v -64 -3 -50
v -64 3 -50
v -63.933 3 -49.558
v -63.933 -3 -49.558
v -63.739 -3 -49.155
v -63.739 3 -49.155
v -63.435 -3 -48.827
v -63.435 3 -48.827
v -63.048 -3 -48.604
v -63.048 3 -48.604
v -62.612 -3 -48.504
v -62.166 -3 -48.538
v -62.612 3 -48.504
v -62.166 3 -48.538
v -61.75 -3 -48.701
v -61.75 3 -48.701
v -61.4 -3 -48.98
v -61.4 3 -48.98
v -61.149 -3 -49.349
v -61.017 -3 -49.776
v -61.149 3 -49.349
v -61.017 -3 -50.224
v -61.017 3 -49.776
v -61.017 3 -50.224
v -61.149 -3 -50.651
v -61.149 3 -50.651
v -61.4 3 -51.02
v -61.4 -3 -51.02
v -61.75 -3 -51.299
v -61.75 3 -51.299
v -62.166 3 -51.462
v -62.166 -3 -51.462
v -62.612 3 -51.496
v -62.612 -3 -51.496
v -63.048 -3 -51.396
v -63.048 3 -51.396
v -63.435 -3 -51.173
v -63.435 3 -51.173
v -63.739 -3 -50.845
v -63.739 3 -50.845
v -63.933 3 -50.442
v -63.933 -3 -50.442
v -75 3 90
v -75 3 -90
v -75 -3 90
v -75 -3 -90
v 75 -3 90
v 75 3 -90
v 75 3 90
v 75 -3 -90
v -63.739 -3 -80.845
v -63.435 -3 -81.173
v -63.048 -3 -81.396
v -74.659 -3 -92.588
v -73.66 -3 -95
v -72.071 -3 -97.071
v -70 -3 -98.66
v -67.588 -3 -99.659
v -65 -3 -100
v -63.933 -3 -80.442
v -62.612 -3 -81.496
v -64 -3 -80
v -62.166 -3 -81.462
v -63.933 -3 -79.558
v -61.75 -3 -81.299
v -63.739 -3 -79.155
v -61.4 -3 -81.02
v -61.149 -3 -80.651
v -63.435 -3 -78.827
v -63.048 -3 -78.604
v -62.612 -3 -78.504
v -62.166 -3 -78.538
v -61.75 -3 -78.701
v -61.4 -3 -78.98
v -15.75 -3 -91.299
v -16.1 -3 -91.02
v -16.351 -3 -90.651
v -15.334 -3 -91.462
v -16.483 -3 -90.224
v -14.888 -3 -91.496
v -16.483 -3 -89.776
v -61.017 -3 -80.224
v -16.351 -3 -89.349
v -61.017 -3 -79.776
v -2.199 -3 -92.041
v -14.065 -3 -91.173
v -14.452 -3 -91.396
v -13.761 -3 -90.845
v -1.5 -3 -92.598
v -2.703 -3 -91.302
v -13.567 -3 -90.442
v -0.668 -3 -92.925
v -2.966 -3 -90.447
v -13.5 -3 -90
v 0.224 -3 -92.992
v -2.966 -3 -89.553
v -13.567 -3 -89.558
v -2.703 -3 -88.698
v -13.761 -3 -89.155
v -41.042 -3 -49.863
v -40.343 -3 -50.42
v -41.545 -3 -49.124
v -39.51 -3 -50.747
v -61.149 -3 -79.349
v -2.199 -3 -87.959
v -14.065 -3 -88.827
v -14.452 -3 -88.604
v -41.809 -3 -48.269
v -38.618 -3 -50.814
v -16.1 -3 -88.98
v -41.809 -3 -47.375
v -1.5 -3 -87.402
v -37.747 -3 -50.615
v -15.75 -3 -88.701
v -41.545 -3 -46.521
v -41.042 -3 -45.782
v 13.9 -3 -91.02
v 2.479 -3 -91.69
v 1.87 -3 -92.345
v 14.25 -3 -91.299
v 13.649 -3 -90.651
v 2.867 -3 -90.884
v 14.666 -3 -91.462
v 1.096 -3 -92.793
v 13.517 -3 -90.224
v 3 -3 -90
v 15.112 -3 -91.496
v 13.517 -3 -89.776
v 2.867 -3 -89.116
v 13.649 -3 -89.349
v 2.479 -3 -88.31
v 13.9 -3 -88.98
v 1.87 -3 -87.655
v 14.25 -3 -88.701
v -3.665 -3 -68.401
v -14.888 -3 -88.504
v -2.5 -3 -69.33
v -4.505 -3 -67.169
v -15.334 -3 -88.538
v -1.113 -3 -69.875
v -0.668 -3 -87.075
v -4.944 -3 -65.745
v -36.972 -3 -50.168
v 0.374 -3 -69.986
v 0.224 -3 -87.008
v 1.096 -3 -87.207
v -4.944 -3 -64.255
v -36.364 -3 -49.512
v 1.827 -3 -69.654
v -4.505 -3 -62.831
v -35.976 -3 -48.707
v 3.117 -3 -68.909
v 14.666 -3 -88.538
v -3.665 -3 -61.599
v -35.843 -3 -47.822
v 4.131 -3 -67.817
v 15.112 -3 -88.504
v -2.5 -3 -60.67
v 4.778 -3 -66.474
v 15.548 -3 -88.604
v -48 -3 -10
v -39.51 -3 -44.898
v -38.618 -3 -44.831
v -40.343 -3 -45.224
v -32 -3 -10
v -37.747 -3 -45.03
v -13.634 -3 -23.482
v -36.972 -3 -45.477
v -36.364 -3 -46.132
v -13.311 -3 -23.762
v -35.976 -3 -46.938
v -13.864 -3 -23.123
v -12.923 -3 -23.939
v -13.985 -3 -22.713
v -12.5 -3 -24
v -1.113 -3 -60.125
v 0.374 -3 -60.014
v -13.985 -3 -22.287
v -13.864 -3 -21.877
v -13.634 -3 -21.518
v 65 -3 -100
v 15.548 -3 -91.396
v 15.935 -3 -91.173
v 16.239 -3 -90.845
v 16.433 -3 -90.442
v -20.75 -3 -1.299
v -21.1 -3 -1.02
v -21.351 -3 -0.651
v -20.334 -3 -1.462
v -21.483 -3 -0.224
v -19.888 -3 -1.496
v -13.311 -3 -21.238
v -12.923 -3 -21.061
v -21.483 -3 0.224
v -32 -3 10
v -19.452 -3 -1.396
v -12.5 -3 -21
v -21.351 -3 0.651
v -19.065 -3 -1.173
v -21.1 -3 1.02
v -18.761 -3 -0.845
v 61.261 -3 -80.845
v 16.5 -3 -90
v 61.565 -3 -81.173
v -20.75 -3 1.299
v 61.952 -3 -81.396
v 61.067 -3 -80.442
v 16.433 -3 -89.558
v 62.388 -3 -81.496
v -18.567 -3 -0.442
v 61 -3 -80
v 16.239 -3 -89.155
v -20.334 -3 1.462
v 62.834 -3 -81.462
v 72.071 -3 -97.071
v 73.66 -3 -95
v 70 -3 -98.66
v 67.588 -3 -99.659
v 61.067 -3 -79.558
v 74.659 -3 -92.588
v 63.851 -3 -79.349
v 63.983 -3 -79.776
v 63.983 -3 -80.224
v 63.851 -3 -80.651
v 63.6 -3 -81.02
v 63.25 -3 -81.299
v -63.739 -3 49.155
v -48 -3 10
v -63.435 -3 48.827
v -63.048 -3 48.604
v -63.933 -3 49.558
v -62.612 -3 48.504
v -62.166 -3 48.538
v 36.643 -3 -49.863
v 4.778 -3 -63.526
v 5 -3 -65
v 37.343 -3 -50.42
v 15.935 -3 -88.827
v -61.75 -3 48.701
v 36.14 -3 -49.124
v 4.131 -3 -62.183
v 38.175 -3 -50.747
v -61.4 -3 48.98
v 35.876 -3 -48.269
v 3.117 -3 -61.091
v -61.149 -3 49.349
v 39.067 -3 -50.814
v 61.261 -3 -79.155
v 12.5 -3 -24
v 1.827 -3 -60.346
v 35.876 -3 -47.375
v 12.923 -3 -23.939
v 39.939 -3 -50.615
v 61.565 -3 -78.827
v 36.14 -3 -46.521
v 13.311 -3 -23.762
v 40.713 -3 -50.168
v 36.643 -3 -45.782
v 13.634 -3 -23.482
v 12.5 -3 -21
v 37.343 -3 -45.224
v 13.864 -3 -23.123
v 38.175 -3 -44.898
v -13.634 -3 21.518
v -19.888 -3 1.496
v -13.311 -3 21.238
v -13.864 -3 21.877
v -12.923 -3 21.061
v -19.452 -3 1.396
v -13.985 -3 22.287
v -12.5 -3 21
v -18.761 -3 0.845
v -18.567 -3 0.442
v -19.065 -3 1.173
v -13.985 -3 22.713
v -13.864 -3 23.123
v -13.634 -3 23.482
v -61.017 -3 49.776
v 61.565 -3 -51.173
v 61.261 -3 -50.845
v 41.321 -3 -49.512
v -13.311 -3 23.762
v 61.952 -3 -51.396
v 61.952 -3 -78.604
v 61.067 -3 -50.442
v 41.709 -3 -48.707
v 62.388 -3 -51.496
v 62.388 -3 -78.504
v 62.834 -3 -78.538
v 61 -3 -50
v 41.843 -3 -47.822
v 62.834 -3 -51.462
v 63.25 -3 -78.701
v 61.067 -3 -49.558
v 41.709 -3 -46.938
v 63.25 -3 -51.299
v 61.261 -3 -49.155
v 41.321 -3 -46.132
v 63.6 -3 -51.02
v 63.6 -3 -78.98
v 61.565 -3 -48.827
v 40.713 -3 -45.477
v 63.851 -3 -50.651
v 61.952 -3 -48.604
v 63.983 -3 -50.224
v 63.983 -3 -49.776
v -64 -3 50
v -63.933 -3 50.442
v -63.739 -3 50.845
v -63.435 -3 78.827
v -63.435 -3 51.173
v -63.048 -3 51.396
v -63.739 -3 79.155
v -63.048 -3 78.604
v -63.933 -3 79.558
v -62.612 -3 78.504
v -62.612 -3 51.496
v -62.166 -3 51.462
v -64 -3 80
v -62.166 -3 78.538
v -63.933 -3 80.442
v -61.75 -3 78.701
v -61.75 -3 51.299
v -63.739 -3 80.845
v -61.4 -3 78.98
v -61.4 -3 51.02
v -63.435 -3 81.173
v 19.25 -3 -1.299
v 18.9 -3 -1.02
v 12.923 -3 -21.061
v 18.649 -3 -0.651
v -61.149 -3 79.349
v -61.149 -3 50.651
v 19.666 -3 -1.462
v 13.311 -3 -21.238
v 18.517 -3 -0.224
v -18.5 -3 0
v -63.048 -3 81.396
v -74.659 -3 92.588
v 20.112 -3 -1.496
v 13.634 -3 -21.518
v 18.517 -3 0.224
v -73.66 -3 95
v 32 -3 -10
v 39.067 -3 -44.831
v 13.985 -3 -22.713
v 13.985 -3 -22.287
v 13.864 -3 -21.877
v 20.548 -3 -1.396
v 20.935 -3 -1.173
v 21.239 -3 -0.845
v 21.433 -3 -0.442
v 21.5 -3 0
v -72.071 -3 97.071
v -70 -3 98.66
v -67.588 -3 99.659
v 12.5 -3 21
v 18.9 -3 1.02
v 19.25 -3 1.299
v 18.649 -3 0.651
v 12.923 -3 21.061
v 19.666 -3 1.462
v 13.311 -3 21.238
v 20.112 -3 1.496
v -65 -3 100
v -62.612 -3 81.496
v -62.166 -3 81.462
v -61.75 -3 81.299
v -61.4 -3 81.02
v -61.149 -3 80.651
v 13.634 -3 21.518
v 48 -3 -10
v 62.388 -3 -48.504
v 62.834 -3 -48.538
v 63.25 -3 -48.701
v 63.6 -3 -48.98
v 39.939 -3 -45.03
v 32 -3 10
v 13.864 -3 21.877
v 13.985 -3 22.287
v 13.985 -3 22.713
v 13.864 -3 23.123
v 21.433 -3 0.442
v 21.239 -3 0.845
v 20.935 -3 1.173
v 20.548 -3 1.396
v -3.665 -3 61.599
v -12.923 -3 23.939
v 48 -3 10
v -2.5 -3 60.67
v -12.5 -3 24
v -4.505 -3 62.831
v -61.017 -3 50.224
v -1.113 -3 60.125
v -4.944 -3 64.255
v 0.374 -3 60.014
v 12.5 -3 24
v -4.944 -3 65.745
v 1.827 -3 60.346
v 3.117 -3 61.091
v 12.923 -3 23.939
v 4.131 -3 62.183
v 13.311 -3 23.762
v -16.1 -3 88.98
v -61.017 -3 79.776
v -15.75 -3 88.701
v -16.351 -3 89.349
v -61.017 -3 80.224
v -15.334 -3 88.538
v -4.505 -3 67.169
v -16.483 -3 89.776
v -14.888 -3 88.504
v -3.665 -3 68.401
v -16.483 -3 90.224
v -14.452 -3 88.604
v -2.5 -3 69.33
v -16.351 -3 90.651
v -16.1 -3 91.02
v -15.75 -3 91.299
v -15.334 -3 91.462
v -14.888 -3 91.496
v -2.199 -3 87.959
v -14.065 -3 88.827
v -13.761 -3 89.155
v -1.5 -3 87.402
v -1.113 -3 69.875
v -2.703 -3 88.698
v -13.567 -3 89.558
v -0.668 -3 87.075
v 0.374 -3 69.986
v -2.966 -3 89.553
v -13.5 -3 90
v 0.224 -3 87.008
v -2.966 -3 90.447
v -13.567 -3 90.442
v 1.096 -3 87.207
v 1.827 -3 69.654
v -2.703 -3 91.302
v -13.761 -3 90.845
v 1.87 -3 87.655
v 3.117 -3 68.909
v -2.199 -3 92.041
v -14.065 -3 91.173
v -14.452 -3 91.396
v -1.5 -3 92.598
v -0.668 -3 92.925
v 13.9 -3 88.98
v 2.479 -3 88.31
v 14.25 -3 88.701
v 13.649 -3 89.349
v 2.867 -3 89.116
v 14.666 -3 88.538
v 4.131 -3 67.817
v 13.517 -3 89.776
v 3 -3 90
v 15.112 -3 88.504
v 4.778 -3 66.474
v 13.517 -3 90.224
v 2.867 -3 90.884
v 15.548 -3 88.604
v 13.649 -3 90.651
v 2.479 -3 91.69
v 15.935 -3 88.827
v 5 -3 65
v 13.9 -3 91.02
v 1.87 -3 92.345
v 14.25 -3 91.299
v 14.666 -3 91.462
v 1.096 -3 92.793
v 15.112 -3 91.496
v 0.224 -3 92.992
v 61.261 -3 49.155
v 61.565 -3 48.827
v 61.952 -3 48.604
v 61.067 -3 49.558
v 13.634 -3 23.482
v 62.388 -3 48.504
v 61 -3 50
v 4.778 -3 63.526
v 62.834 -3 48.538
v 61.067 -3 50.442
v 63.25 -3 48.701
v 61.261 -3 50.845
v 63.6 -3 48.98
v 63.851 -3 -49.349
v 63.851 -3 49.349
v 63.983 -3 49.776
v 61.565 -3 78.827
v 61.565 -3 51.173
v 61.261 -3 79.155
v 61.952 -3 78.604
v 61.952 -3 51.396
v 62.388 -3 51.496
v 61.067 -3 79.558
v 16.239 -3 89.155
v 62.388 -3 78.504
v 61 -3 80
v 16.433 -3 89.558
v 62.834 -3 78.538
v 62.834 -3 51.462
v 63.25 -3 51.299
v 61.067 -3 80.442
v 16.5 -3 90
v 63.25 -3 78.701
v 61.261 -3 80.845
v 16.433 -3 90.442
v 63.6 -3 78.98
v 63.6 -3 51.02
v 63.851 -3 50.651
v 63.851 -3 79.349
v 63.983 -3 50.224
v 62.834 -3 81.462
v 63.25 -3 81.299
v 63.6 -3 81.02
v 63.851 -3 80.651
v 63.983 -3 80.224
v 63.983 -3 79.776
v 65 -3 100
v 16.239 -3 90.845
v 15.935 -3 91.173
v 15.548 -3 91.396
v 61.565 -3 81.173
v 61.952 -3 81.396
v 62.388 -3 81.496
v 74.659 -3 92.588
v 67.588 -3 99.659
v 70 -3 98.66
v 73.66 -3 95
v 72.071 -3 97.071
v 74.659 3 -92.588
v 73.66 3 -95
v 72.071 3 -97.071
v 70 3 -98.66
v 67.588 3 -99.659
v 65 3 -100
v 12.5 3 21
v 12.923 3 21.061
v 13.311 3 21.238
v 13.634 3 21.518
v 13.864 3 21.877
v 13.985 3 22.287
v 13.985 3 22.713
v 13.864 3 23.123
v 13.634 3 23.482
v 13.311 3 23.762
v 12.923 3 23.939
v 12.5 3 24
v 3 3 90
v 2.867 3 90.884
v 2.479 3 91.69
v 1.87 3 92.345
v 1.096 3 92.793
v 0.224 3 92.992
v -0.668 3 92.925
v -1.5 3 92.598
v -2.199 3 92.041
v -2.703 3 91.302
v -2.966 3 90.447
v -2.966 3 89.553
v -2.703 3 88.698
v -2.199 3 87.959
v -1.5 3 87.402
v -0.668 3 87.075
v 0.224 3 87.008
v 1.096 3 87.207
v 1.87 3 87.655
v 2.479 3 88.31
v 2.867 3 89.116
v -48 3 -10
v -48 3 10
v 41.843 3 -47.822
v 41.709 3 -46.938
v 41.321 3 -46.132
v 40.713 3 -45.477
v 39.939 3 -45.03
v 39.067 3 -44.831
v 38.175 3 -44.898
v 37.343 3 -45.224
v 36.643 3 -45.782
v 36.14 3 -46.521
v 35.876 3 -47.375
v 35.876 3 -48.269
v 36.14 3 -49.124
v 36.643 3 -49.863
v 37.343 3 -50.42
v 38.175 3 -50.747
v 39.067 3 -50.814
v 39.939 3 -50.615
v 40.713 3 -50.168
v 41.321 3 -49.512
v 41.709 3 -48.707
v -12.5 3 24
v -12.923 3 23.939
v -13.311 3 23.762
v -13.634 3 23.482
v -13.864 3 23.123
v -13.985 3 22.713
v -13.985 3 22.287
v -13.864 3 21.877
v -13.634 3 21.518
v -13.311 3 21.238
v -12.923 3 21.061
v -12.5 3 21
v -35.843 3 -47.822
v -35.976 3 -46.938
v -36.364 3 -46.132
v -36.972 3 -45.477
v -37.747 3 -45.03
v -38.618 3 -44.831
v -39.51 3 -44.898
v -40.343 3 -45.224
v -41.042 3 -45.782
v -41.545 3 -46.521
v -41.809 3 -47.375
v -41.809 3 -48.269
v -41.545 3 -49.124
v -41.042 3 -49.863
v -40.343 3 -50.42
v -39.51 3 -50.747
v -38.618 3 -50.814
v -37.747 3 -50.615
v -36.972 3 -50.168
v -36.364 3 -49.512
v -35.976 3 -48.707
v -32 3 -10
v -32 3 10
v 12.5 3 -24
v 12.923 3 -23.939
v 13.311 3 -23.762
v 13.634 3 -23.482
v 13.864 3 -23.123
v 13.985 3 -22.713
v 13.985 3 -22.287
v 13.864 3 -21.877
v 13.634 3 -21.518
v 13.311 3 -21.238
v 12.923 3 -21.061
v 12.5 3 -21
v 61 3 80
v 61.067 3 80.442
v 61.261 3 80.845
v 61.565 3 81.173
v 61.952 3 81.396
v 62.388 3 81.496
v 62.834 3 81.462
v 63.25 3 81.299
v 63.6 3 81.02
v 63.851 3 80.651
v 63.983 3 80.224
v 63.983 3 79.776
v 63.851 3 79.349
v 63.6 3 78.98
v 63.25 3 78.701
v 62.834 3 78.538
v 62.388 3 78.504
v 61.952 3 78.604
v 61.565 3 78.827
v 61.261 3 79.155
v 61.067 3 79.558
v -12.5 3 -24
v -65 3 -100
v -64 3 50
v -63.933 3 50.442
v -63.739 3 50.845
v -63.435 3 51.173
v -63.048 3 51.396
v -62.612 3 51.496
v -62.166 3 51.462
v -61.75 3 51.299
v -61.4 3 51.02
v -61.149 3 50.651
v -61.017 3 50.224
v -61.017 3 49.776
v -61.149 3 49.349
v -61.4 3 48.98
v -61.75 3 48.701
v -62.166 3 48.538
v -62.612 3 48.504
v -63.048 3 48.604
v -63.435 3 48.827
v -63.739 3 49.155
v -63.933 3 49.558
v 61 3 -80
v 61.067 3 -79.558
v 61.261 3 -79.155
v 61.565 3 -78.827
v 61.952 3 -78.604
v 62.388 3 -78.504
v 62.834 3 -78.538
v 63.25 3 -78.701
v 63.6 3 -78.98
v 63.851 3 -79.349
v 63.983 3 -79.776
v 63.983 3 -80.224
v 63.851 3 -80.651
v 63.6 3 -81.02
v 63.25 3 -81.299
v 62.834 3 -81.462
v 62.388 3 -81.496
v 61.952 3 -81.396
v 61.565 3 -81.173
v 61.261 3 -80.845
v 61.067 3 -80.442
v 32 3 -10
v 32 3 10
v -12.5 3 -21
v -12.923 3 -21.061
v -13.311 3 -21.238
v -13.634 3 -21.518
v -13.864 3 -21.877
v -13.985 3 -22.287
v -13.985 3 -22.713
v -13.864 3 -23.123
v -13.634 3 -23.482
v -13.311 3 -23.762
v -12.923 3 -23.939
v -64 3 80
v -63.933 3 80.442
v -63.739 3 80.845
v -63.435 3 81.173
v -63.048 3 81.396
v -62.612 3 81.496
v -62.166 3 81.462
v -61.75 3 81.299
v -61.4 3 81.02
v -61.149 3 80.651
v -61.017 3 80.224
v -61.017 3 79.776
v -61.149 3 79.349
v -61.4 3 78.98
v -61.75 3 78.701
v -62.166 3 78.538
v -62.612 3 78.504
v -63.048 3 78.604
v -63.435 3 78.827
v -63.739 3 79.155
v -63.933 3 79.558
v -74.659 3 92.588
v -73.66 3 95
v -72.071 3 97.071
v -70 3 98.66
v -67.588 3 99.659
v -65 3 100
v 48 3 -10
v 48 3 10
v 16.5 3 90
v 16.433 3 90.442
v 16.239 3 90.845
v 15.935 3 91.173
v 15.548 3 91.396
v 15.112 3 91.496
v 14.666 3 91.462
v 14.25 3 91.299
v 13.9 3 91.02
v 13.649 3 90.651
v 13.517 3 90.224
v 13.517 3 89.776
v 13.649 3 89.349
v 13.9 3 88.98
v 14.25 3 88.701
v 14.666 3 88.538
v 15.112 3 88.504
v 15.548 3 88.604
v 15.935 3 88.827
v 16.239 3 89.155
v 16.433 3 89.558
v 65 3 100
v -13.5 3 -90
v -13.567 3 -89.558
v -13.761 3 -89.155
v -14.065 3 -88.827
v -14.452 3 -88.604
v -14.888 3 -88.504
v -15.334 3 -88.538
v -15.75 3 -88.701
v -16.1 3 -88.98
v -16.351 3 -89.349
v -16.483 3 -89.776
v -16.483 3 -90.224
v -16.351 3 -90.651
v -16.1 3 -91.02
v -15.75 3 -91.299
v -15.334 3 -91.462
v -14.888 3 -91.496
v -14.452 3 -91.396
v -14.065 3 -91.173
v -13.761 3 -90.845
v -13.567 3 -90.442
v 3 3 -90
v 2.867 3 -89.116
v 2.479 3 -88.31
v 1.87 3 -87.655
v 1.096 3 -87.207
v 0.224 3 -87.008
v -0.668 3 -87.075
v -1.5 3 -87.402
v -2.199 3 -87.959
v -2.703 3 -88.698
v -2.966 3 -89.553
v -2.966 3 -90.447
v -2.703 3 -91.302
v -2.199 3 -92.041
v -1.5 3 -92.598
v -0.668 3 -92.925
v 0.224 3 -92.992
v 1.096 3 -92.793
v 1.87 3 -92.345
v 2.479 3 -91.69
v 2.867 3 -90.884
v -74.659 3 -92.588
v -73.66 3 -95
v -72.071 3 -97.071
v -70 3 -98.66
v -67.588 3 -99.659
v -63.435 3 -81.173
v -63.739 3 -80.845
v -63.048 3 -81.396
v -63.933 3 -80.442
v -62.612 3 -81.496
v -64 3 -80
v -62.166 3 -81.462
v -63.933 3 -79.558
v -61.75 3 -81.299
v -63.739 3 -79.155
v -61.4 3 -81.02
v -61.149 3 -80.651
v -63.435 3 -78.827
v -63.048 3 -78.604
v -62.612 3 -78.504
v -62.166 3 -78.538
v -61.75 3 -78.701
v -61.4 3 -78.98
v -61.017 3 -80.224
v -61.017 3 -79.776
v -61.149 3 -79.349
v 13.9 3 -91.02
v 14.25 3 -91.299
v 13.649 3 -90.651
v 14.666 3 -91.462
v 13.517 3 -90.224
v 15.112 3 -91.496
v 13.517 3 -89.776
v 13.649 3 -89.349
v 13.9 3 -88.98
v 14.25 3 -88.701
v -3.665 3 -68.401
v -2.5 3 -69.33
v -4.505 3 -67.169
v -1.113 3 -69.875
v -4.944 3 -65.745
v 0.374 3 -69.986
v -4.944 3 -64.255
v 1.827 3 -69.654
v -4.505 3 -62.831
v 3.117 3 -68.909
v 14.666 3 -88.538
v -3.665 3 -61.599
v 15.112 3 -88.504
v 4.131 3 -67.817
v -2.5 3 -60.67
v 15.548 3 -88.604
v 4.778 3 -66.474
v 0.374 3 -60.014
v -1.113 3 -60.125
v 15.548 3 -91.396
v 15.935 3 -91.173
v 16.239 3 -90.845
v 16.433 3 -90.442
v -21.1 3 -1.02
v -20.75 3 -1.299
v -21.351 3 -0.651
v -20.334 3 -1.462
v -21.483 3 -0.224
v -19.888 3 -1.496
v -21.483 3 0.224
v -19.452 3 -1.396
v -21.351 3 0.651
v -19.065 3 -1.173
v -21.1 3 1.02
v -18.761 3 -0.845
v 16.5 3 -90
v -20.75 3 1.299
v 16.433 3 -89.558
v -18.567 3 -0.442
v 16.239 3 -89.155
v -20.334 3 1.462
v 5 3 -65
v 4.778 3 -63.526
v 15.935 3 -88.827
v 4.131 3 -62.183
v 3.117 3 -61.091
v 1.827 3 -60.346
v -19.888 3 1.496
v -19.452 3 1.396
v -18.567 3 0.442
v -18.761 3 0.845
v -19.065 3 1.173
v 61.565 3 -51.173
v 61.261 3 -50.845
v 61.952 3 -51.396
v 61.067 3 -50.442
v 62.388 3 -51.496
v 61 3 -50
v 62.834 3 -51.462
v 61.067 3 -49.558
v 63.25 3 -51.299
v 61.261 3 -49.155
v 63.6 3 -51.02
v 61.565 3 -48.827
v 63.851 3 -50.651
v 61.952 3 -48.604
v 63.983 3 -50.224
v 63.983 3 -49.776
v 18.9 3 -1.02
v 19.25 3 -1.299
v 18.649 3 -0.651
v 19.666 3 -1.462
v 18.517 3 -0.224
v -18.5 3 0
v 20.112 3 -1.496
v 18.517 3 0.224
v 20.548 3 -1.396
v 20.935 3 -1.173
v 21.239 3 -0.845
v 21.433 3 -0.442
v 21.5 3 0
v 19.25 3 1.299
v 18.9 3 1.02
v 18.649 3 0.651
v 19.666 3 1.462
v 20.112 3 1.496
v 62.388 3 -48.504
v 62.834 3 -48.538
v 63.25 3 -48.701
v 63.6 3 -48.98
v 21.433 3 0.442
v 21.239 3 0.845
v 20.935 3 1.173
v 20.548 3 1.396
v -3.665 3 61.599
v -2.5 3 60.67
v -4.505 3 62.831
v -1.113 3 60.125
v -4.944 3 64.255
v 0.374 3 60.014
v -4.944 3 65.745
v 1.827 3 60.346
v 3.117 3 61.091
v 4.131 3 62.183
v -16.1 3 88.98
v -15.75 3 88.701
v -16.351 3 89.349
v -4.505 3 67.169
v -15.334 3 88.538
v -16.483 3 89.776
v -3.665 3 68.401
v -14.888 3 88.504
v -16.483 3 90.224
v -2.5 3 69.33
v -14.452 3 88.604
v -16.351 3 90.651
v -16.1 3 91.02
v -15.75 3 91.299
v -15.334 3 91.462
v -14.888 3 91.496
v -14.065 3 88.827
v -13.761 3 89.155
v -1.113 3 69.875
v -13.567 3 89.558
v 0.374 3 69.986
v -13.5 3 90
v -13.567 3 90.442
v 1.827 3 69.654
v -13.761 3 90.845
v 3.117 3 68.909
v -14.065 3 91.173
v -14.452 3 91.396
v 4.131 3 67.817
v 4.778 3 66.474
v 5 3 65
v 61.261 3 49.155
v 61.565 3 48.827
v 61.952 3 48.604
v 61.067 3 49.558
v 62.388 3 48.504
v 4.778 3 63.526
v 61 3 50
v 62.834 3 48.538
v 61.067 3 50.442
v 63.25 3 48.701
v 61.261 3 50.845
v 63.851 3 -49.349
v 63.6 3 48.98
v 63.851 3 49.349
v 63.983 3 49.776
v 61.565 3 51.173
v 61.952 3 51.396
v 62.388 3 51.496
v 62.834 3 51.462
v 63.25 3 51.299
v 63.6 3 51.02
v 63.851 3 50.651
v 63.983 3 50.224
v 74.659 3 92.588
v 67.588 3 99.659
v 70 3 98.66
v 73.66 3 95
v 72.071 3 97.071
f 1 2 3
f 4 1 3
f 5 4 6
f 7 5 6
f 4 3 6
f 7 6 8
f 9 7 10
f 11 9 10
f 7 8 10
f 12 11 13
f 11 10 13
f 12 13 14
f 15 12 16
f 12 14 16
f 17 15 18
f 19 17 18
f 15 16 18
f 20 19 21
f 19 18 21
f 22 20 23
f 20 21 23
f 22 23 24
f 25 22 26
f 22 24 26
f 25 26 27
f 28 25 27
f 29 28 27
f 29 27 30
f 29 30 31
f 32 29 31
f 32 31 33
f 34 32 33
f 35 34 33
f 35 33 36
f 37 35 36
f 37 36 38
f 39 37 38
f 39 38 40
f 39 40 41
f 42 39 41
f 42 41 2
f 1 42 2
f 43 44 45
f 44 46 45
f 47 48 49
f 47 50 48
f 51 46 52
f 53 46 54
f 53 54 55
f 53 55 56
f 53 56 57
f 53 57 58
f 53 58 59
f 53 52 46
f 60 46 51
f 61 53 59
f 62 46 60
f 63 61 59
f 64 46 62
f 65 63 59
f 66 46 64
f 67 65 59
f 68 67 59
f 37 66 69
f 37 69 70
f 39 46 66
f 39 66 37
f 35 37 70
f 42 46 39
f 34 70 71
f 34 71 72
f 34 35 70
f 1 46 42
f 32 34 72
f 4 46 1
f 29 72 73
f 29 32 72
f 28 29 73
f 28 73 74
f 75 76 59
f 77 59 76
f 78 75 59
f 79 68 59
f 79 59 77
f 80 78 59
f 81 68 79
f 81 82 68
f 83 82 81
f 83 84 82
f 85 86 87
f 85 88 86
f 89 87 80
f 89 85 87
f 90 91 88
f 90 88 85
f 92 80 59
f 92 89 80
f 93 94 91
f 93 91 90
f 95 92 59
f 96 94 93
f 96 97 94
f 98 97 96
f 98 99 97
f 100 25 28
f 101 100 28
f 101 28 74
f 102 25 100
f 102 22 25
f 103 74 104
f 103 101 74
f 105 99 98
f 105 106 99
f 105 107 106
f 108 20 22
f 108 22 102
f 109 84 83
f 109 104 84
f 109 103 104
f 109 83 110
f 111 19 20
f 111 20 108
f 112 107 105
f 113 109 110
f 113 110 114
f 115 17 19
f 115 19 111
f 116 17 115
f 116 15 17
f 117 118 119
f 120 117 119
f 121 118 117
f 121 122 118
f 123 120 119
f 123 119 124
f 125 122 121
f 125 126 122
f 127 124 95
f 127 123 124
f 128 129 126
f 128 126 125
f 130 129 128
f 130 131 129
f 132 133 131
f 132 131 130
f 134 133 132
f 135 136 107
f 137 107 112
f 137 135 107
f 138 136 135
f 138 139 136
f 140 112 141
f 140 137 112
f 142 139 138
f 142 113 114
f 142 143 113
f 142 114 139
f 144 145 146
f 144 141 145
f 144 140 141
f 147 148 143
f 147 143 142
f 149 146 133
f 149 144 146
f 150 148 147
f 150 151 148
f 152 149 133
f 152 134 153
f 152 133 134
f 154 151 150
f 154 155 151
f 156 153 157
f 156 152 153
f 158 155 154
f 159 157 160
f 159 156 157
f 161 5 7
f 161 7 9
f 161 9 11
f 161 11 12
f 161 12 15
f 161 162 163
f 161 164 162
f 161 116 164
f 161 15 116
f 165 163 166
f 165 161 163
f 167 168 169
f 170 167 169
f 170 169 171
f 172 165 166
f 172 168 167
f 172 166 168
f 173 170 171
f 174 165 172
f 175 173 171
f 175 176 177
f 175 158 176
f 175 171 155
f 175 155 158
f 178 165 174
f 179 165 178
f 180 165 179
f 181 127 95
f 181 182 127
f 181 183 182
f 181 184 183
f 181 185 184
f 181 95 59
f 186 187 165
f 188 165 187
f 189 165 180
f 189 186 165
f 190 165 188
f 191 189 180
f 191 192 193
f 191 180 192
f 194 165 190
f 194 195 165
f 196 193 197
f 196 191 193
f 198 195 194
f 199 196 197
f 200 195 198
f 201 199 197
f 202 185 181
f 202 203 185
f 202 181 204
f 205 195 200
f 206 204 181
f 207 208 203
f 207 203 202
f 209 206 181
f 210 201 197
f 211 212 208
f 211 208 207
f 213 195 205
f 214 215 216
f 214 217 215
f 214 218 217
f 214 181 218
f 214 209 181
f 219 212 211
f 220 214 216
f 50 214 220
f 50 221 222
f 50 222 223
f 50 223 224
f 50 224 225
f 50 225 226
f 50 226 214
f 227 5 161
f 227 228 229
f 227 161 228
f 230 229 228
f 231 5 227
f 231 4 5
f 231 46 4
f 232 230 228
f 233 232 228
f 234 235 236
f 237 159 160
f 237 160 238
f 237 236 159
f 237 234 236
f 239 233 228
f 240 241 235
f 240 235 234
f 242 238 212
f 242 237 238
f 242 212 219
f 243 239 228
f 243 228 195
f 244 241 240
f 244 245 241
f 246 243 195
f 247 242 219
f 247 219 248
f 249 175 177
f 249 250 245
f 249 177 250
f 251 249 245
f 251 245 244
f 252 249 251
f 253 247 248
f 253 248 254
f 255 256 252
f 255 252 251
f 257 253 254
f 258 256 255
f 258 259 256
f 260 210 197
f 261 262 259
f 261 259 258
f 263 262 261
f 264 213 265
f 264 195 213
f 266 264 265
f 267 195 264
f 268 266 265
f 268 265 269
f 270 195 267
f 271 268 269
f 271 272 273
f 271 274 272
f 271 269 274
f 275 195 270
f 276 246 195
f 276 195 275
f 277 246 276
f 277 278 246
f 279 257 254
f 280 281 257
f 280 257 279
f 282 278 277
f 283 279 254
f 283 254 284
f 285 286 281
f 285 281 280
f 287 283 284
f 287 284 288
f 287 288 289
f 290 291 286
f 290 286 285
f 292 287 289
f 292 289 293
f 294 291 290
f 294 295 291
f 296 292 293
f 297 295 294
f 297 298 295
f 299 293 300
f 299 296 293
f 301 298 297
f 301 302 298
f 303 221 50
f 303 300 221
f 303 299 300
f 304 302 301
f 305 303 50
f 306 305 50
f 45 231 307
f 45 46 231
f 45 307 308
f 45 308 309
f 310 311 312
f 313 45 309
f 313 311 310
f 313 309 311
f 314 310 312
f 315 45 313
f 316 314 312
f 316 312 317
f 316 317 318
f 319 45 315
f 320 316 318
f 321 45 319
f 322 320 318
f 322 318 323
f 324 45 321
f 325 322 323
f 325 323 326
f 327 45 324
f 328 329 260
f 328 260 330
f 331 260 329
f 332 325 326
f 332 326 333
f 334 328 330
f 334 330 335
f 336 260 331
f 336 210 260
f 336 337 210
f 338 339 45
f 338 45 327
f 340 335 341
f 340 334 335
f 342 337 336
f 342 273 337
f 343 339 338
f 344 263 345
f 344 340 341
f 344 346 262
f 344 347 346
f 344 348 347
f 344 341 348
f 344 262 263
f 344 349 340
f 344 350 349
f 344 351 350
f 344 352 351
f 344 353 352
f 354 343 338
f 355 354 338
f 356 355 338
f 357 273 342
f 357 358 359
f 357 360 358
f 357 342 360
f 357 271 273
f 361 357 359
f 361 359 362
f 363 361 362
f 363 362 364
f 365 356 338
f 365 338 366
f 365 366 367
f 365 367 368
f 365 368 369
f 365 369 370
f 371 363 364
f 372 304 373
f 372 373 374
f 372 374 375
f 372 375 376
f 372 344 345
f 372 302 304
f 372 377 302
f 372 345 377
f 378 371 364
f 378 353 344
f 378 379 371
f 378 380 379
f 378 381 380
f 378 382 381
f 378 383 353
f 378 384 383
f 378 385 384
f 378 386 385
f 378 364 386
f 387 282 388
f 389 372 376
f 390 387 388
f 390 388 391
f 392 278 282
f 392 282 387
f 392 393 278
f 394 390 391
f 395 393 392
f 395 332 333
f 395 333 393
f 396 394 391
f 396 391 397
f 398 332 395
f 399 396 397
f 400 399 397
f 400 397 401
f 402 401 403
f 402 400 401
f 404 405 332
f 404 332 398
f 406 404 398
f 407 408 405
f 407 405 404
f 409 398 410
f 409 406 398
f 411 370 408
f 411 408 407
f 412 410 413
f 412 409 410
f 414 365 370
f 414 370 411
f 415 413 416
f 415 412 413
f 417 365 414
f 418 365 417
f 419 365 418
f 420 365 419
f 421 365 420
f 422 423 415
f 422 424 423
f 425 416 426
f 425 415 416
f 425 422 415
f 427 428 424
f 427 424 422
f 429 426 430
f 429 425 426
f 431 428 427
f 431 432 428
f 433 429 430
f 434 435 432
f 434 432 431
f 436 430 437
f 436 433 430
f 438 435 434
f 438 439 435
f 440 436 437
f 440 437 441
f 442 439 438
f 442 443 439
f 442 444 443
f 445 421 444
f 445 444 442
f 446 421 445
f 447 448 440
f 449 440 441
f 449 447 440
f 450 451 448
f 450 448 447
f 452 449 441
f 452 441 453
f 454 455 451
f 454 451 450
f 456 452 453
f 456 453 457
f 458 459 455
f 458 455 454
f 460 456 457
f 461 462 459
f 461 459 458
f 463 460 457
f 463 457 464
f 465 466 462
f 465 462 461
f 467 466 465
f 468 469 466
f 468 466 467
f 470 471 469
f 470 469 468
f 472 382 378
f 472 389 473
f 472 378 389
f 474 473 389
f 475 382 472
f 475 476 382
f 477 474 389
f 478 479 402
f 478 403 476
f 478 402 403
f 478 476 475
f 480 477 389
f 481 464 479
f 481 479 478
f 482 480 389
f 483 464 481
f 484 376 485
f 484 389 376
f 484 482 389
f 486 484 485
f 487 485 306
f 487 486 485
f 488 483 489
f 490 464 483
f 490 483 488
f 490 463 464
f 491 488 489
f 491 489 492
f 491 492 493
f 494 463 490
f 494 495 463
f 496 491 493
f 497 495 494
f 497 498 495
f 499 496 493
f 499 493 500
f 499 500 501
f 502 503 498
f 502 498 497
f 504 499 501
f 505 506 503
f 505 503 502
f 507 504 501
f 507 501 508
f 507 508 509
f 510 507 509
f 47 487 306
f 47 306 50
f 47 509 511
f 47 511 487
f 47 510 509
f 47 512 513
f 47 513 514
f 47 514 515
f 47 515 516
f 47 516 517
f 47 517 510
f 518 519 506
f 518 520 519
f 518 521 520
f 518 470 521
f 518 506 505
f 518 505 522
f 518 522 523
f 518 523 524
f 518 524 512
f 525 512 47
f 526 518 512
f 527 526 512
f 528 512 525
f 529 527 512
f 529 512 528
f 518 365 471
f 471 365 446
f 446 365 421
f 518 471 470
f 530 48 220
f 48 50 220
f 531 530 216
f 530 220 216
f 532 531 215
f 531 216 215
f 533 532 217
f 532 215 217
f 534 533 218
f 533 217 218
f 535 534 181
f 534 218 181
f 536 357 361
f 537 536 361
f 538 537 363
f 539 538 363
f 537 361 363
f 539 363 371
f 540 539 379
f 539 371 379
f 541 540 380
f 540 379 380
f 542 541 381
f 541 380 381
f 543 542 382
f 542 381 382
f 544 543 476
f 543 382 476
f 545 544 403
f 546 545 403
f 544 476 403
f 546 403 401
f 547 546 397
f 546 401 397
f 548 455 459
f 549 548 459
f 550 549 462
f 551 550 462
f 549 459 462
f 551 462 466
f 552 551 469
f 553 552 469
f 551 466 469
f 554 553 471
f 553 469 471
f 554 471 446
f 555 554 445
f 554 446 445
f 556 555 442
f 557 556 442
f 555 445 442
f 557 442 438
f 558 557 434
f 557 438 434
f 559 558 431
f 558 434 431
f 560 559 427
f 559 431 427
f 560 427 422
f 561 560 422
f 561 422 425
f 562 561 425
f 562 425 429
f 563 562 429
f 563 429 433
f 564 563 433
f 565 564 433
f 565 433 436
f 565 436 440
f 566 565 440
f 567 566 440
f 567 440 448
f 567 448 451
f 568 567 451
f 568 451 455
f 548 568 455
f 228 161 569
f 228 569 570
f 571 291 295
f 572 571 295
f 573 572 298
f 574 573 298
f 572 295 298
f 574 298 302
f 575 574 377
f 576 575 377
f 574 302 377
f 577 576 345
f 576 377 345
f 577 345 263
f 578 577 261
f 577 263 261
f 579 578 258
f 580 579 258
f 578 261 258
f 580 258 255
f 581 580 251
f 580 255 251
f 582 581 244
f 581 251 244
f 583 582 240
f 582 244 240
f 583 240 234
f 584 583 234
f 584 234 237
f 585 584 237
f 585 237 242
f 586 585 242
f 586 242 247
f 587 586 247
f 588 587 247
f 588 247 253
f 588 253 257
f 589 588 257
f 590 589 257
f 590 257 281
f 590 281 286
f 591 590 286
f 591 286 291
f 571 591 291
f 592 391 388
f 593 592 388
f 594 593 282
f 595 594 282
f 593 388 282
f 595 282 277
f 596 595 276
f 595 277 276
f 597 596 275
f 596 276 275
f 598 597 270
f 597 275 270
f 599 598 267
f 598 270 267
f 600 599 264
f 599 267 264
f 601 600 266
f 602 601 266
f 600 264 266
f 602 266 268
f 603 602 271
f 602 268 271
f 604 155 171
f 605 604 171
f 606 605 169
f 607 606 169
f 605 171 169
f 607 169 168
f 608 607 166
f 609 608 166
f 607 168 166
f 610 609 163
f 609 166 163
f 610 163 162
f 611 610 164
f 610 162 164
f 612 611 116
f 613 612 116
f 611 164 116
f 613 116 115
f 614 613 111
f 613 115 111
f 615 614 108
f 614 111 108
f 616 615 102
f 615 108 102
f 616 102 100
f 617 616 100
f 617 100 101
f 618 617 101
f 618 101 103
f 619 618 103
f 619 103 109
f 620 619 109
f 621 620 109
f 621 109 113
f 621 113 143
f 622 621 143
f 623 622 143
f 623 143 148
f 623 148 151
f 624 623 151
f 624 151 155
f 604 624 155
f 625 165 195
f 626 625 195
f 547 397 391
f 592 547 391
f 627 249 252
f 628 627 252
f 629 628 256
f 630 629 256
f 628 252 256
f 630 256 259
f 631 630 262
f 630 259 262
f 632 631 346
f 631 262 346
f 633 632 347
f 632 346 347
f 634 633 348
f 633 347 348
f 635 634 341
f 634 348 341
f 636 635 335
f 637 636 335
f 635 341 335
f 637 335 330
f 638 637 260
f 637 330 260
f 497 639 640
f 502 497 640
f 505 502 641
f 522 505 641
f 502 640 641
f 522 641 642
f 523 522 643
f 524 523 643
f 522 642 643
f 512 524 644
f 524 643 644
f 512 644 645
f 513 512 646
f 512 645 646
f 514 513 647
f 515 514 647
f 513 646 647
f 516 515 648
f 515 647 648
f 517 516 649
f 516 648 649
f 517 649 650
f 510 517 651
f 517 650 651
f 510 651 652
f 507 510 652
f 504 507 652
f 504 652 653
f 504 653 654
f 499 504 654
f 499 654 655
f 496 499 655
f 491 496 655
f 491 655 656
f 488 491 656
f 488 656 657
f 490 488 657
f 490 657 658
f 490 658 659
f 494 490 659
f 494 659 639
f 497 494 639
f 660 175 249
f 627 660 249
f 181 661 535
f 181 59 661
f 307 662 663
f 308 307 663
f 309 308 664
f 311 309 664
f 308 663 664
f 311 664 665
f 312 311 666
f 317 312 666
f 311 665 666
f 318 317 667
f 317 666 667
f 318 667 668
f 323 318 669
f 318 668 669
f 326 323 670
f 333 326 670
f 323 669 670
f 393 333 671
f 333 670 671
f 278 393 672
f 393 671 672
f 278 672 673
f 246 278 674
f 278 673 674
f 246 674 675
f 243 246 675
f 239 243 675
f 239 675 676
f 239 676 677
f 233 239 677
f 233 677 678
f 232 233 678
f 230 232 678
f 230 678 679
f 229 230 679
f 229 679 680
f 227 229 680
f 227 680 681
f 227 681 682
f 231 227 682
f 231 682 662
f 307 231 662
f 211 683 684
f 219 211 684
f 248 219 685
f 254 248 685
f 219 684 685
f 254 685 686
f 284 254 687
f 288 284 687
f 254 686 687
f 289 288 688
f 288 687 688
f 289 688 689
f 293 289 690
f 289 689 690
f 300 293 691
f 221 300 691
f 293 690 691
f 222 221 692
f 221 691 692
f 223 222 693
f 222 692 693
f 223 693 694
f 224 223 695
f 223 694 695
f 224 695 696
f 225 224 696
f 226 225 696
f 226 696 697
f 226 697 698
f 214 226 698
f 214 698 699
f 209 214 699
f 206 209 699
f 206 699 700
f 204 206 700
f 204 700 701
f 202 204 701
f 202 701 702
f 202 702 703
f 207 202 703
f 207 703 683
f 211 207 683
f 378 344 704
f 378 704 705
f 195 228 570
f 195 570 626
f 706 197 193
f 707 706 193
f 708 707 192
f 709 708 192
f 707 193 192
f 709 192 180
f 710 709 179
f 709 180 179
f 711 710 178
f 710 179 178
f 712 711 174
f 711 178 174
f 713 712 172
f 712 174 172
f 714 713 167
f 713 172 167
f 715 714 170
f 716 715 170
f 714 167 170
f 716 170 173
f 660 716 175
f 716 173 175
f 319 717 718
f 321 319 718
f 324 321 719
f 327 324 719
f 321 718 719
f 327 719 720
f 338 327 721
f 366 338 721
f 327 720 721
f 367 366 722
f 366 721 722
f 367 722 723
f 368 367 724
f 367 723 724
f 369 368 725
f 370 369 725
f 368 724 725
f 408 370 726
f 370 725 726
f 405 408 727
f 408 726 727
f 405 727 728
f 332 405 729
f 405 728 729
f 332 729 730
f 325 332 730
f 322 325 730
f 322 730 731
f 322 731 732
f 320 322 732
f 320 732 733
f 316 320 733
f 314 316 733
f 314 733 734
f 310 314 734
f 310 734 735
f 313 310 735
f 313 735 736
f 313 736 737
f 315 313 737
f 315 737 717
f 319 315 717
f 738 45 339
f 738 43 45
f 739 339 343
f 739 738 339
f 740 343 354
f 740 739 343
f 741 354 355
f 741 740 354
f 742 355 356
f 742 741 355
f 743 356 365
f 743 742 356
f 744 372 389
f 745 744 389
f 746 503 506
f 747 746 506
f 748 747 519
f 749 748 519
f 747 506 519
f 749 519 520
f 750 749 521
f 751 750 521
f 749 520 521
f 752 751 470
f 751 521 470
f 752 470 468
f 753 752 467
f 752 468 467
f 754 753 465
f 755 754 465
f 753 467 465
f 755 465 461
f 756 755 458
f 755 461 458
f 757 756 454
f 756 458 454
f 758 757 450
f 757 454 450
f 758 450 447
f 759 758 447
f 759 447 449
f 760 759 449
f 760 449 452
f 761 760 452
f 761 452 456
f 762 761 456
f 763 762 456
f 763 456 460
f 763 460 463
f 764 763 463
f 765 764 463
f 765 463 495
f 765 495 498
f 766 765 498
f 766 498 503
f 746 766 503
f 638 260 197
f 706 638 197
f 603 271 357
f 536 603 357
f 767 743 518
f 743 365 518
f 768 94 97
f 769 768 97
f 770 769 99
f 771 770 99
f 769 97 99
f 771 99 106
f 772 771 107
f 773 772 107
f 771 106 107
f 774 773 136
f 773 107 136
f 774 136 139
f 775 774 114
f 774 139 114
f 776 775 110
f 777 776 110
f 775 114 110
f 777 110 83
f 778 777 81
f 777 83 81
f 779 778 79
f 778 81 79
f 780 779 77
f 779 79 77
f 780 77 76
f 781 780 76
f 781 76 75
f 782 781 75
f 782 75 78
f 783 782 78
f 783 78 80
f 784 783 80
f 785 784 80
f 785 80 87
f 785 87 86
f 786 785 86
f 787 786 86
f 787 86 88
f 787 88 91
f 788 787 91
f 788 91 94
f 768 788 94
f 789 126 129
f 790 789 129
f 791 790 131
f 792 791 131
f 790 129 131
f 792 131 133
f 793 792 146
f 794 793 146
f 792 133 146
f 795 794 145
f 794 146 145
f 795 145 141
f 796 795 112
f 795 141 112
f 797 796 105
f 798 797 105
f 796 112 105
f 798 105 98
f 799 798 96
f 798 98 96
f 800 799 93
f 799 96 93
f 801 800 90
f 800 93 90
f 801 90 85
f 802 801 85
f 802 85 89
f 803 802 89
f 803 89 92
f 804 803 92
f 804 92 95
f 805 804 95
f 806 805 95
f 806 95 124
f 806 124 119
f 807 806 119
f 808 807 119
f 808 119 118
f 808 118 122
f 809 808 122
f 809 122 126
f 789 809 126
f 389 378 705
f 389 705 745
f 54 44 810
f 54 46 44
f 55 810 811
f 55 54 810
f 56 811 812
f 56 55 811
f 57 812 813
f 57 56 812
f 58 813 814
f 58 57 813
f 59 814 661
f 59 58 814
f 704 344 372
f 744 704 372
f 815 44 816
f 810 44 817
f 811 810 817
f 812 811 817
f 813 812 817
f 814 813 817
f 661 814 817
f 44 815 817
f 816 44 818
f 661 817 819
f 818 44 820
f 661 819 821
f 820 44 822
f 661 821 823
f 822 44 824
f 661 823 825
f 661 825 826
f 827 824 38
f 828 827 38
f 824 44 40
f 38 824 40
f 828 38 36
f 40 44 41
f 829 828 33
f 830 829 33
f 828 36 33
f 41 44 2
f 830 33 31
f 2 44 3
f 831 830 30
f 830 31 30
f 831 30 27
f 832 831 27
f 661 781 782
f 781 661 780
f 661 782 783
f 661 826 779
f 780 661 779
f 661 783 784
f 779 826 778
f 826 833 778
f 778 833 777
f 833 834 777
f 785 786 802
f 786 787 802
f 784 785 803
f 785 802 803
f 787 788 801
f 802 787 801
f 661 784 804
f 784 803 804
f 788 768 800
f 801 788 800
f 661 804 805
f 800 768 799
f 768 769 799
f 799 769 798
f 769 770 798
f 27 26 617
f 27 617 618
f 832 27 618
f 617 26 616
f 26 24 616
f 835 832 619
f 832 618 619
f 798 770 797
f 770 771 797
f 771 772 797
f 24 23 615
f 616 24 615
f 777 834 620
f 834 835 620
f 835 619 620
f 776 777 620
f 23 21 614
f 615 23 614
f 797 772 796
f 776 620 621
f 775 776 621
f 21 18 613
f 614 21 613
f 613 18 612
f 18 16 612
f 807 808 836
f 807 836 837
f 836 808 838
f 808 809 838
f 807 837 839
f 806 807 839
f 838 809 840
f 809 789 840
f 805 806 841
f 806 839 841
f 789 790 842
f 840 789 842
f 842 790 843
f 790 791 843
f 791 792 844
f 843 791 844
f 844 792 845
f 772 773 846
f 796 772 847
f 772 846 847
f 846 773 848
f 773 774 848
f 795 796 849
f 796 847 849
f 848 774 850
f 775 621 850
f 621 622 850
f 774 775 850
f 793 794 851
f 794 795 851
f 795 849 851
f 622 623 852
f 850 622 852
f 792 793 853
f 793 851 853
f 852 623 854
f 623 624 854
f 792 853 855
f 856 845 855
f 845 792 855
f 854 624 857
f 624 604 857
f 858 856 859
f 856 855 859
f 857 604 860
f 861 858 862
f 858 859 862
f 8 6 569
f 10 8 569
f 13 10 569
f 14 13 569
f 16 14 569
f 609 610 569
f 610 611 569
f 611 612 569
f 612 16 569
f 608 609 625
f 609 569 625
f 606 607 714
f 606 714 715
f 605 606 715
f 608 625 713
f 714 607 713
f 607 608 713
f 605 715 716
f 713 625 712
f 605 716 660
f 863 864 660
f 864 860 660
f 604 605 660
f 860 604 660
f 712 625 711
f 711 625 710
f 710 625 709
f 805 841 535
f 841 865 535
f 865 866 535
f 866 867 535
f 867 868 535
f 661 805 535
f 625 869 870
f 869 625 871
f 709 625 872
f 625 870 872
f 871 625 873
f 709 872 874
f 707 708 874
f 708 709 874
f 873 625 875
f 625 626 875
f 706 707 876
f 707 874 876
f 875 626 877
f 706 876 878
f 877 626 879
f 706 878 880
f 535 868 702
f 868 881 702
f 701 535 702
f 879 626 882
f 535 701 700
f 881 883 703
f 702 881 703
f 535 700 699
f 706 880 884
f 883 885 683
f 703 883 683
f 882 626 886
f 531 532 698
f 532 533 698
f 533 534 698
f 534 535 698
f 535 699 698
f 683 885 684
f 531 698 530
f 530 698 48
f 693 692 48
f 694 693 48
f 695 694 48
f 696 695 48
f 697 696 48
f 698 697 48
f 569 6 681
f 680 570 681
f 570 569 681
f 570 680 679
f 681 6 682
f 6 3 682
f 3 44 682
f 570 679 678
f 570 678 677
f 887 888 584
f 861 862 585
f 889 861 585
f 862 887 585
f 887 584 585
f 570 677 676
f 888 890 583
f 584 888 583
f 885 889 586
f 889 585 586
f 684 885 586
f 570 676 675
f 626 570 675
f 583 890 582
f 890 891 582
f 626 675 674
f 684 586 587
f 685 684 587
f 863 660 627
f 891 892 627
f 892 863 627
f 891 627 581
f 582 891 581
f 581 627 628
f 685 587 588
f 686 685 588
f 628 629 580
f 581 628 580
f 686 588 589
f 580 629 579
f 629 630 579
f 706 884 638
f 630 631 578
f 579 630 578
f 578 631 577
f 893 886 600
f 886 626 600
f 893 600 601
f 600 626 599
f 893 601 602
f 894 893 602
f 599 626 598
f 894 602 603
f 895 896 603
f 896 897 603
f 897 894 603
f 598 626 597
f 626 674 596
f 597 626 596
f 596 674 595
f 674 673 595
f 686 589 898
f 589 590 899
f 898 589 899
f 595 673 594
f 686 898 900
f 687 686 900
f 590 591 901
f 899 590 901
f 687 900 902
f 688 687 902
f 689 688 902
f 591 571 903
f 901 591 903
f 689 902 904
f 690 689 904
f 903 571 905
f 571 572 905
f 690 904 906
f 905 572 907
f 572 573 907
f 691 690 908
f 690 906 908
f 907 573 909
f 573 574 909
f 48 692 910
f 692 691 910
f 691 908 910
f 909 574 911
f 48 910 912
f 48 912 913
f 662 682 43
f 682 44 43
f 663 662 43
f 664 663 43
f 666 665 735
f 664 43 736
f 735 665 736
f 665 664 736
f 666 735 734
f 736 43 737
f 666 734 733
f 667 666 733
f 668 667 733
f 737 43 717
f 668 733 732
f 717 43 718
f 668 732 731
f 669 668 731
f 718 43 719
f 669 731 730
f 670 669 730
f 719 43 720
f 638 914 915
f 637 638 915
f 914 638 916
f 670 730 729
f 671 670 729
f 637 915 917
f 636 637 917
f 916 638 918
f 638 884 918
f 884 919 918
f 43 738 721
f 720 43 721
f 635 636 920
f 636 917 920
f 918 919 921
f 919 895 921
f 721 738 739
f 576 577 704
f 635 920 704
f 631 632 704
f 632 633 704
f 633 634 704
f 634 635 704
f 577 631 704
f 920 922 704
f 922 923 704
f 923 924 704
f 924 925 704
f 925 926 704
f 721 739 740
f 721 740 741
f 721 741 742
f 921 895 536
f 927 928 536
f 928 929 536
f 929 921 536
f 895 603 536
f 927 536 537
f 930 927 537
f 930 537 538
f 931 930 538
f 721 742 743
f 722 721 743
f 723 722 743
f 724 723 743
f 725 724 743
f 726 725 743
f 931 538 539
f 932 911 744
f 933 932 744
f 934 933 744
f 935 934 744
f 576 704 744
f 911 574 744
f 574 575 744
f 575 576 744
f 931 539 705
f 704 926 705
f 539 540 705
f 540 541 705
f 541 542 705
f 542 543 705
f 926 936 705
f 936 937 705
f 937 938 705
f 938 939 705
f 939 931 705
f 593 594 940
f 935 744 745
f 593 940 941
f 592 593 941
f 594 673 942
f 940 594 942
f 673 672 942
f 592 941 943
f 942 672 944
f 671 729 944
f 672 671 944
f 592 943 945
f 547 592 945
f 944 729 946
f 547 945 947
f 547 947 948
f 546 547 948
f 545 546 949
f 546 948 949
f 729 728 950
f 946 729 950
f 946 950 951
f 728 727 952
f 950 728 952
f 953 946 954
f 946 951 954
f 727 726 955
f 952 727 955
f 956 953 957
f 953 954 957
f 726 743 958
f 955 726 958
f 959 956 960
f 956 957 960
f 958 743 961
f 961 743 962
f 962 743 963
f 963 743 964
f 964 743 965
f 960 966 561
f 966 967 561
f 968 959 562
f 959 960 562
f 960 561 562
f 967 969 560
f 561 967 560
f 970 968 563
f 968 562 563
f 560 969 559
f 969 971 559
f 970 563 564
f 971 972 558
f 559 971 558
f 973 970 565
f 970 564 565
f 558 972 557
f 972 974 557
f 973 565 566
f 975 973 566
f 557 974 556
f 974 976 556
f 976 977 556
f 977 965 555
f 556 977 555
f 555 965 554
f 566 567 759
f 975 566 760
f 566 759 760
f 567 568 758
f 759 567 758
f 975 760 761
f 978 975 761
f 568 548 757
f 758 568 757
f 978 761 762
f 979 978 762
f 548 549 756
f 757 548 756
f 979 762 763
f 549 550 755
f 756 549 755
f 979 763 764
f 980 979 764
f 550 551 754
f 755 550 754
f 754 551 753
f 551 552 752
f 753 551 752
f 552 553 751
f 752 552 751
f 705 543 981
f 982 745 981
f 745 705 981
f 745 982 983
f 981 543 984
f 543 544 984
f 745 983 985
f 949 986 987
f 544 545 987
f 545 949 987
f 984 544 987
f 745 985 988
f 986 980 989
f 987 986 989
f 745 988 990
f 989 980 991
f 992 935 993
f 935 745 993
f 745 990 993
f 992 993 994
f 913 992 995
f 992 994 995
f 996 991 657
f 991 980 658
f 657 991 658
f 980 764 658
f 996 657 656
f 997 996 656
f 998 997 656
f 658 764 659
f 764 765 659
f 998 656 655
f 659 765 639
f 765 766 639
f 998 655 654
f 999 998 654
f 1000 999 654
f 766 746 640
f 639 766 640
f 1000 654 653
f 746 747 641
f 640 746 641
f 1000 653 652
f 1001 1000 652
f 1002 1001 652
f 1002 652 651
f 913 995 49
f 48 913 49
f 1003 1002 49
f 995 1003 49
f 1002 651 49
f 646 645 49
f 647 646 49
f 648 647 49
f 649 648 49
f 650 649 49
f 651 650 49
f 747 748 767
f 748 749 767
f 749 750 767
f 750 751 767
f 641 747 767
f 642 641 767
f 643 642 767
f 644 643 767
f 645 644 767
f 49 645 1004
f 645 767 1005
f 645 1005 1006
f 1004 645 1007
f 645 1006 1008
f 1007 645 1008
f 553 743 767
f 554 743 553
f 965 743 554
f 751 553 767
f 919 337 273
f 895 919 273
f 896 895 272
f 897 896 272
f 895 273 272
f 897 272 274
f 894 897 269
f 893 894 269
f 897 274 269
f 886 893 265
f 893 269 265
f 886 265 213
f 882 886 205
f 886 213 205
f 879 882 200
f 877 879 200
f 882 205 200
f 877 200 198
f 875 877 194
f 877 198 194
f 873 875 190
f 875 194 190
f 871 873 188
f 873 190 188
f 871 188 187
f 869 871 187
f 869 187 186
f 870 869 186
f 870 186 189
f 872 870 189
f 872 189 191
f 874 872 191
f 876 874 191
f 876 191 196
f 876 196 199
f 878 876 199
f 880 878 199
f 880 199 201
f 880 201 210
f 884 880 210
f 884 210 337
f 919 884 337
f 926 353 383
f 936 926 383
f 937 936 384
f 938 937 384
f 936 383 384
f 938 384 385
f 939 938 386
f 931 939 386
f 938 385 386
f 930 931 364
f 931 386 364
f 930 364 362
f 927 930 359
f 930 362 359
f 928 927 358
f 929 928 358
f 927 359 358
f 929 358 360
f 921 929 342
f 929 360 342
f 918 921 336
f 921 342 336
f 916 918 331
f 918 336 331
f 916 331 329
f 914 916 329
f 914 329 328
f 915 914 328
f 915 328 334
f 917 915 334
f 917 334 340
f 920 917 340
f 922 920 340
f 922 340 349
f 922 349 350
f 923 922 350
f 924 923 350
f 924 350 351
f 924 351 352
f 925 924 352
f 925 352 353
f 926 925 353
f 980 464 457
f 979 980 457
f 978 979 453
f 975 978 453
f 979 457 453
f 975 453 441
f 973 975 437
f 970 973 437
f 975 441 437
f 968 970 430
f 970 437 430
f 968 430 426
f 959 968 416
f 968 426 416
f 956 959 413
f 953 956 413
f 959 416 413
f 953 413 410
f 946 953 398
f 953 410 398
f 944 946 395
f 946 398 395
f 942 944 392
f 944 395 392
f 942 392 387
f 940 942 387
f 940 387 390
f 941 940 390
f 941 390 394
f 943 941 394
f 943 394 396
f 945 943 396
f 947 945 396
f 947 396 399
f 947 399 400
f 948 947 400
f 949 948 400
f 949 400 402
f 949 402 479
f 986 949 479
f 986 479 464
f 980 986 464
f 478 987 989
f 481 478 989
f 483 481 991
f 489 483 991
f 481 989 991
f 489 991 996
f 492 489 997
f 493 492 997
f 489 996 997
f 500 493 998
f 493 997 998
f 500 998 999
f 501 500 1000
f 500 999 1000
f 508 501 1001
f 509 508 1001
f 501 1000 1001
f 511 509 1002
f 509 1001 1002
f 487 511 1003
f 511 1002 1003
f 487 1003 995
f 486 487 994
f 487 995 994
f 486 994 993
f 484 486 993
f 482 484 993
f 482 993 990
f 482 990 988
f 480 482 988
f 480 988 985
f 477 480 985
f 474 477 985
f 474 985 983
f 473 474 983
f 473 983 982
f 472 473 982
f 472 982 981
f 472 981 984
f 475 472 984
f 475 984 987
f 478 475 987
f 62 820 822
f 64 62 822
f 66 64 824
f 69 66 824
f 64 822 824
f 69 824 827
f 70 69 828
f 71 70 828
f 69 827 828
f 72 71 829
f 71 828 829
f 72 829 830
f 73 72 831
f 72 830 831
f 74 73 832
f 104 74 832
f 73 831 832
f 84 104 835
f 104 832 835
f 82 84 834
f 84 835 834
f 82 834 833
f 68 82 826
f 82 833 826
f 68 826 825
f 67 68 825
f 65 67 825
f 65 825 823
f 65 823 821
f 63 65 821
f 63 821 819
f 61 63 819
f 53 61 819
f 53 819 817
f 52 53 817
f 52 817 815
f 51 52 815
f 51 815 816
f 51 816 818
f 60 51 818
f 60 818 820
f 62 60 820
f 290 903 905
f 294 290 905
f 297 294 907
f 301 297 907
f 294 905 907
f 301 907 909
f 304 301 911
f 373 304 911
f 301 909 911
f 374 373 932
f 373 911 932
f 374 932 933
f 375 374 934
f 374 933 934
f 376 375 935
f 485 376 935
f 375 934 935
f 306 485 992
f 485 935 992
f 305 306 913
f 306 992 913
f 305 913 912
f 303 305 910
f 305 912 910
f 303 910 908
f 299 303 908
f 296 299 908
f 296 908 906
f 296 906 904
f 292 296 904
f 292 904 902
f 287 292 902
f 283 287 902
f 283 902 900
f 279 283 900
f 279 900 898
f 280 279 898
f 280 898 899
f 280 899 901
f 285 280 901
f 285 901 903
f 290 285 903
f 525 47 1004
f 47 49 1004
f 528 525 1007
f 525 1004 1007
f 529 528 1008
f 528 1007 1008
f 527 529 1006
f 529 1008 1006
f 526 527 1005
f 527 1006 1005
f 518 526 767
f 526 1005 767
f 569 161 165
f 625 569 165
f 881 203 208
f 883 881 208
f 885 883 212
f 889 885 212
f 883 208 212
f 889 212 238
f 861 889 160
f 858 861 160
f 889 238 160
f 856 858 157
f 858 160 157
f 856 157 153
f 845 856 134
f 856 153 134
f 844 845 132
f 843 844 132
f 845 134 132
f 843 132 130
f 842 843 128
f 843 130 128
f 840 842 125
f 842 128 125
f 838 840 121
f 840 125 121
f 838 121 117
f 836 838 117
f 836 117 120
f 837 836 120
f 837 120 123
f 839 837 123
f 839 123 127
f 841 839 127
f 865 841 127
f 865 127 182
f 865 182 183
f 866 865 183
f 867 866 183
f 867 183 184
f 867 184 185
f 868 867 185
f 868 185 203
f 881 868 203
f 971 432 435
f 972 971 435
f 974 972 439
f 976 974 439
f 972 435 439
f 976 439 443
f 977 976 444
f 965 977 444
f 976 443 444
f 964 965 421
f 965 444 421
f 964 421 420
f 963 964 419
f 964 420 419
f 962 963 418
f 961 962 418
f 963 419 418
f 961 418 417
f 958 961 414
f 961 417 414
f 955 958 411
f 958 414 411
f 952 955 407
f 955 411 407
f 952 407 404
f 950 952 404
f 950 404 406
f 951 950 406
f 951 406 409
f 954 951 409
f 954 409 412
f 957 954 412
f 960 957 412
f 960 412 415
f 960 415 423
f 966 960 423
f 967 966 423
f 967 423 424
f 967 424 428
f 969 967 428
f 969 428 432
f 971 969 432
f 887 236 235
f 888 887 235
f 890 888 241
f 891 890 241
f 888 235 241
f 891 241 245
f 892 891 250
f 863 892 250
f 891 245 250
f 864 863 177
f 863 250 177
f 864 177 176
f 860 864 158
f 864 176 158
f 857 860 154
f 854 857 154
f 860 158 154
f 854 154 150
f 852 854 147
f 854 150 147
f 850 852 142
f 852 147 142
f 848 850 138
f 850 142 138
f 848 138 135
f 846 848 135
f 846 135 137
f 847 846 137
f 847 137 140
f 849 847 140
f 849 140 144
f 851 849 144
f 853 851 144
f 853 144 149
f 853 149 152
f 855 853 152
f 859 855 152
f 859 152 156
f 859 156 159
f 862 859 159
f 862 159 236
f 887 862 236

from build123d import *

# Parameters (mm, degrees)
F0_W          = 150
F0_H          = 200
F1_DEPTH      = 3
F1_DEPTH_BACK = 3
F2_R          = 10
F4_D          = 3
F4_DEPTH      = 12
F5_W          = 16
F5_H          = 20
F5_R          = 1.5
F5_R_2        = 5
F5_R_3        = 3
F6_DEPTH      = 25


with BuildPart() as f1:
    # F0 (on Front) → F1 (new body, two sides)
    with BuildSketch(Plane.XZ) as f1_sk:
        Rectangle(F0_W, F0_H)
    extrude(amount=F1_DEPTH)
    extrude(f1_sk.sketch, amount=-F1_DEPTH_BACK)

    # F2
    f2_edges = [f1.edges().sort_by_distance(p)[0] for p in [
        (-75, 0, -100),
        (75, 0, -100),
        (75, 0, 100),
        (-75, 0, 100),
    ]]
    fillet(f2_edges, radius=F2_R)

    # F4
    with Locations(Plane.XZ.offset(3)):
        with Locations((62.5, -80), (62.5, -50), (62.5, 50), (62.5, 80), (-62.5, 80), (-62.5, 50), (-62.5, -50), (-62.5, -80)):
            Hole(F4_D / 2, depth=F4_DEPTH)

    # F5 (on face) → F6 (cut)
    with BuildSketch(Plane.XZ.offset(3)):
        with Locations((-40, 0)):
            Rectangle(F5_W, F5_H)
        with BuildLine():
            ThreePointArc((12.5, 21), (14, 22.5), (12.5, 24))
            Line((12.5, 24), (-12.5, 24))
            ThreePointArc((-12.5, 24), (-14, 22.5), (-12.5, 21))
            Line((-12.5, 21), (12.5, 21))
        make_face()
        with BuildLine():
            ThreePointArc((12.5, -24), (14, -22.5), (12.5, -21))
            Line((12.5, -21), (-12.5, -21))
            ThreePointArc((-12.5, -21), (-14, -22.5), (-12.5, -24))
            Line((-12.5, -24), (12.5, -24))
        make_face()
        with Locations((40, 0)):
            Rectangle(F5_W, F5_H)
        with Locations((20, 0)):
            Circle(F5_R)
        with Locations((0, -65)):
            Circle(F5_R_2)
        with Locations((-38.842574, -47.822315)):
            Circle(F5_R_3)
        with Locations((38.842574, -47.822315)):
            Circle(F5_R_3)
        with Locations((0, -90)):
            Circle(F5_R_3)
        with Locations((-20, 0)):
            Circle(F5_R)
        with Locations((15, -90)):
            Circle(F5_R)
        with Locations((-15, -90)):
            Circle(F5_R)
        with Locations((0, 65)):
            Circle(F5_R_2)
        with Locations((0, 90)):
            Circle(F5_R_3)
        with Locations((-15, 90)):
            Circle(F5_R)
        with Locations((15, 90)):
            Circle(F5_R)
    extrude(amount=-F6_DEPTH, mode=Mode.SUBTRACT)


solid = f1.part
